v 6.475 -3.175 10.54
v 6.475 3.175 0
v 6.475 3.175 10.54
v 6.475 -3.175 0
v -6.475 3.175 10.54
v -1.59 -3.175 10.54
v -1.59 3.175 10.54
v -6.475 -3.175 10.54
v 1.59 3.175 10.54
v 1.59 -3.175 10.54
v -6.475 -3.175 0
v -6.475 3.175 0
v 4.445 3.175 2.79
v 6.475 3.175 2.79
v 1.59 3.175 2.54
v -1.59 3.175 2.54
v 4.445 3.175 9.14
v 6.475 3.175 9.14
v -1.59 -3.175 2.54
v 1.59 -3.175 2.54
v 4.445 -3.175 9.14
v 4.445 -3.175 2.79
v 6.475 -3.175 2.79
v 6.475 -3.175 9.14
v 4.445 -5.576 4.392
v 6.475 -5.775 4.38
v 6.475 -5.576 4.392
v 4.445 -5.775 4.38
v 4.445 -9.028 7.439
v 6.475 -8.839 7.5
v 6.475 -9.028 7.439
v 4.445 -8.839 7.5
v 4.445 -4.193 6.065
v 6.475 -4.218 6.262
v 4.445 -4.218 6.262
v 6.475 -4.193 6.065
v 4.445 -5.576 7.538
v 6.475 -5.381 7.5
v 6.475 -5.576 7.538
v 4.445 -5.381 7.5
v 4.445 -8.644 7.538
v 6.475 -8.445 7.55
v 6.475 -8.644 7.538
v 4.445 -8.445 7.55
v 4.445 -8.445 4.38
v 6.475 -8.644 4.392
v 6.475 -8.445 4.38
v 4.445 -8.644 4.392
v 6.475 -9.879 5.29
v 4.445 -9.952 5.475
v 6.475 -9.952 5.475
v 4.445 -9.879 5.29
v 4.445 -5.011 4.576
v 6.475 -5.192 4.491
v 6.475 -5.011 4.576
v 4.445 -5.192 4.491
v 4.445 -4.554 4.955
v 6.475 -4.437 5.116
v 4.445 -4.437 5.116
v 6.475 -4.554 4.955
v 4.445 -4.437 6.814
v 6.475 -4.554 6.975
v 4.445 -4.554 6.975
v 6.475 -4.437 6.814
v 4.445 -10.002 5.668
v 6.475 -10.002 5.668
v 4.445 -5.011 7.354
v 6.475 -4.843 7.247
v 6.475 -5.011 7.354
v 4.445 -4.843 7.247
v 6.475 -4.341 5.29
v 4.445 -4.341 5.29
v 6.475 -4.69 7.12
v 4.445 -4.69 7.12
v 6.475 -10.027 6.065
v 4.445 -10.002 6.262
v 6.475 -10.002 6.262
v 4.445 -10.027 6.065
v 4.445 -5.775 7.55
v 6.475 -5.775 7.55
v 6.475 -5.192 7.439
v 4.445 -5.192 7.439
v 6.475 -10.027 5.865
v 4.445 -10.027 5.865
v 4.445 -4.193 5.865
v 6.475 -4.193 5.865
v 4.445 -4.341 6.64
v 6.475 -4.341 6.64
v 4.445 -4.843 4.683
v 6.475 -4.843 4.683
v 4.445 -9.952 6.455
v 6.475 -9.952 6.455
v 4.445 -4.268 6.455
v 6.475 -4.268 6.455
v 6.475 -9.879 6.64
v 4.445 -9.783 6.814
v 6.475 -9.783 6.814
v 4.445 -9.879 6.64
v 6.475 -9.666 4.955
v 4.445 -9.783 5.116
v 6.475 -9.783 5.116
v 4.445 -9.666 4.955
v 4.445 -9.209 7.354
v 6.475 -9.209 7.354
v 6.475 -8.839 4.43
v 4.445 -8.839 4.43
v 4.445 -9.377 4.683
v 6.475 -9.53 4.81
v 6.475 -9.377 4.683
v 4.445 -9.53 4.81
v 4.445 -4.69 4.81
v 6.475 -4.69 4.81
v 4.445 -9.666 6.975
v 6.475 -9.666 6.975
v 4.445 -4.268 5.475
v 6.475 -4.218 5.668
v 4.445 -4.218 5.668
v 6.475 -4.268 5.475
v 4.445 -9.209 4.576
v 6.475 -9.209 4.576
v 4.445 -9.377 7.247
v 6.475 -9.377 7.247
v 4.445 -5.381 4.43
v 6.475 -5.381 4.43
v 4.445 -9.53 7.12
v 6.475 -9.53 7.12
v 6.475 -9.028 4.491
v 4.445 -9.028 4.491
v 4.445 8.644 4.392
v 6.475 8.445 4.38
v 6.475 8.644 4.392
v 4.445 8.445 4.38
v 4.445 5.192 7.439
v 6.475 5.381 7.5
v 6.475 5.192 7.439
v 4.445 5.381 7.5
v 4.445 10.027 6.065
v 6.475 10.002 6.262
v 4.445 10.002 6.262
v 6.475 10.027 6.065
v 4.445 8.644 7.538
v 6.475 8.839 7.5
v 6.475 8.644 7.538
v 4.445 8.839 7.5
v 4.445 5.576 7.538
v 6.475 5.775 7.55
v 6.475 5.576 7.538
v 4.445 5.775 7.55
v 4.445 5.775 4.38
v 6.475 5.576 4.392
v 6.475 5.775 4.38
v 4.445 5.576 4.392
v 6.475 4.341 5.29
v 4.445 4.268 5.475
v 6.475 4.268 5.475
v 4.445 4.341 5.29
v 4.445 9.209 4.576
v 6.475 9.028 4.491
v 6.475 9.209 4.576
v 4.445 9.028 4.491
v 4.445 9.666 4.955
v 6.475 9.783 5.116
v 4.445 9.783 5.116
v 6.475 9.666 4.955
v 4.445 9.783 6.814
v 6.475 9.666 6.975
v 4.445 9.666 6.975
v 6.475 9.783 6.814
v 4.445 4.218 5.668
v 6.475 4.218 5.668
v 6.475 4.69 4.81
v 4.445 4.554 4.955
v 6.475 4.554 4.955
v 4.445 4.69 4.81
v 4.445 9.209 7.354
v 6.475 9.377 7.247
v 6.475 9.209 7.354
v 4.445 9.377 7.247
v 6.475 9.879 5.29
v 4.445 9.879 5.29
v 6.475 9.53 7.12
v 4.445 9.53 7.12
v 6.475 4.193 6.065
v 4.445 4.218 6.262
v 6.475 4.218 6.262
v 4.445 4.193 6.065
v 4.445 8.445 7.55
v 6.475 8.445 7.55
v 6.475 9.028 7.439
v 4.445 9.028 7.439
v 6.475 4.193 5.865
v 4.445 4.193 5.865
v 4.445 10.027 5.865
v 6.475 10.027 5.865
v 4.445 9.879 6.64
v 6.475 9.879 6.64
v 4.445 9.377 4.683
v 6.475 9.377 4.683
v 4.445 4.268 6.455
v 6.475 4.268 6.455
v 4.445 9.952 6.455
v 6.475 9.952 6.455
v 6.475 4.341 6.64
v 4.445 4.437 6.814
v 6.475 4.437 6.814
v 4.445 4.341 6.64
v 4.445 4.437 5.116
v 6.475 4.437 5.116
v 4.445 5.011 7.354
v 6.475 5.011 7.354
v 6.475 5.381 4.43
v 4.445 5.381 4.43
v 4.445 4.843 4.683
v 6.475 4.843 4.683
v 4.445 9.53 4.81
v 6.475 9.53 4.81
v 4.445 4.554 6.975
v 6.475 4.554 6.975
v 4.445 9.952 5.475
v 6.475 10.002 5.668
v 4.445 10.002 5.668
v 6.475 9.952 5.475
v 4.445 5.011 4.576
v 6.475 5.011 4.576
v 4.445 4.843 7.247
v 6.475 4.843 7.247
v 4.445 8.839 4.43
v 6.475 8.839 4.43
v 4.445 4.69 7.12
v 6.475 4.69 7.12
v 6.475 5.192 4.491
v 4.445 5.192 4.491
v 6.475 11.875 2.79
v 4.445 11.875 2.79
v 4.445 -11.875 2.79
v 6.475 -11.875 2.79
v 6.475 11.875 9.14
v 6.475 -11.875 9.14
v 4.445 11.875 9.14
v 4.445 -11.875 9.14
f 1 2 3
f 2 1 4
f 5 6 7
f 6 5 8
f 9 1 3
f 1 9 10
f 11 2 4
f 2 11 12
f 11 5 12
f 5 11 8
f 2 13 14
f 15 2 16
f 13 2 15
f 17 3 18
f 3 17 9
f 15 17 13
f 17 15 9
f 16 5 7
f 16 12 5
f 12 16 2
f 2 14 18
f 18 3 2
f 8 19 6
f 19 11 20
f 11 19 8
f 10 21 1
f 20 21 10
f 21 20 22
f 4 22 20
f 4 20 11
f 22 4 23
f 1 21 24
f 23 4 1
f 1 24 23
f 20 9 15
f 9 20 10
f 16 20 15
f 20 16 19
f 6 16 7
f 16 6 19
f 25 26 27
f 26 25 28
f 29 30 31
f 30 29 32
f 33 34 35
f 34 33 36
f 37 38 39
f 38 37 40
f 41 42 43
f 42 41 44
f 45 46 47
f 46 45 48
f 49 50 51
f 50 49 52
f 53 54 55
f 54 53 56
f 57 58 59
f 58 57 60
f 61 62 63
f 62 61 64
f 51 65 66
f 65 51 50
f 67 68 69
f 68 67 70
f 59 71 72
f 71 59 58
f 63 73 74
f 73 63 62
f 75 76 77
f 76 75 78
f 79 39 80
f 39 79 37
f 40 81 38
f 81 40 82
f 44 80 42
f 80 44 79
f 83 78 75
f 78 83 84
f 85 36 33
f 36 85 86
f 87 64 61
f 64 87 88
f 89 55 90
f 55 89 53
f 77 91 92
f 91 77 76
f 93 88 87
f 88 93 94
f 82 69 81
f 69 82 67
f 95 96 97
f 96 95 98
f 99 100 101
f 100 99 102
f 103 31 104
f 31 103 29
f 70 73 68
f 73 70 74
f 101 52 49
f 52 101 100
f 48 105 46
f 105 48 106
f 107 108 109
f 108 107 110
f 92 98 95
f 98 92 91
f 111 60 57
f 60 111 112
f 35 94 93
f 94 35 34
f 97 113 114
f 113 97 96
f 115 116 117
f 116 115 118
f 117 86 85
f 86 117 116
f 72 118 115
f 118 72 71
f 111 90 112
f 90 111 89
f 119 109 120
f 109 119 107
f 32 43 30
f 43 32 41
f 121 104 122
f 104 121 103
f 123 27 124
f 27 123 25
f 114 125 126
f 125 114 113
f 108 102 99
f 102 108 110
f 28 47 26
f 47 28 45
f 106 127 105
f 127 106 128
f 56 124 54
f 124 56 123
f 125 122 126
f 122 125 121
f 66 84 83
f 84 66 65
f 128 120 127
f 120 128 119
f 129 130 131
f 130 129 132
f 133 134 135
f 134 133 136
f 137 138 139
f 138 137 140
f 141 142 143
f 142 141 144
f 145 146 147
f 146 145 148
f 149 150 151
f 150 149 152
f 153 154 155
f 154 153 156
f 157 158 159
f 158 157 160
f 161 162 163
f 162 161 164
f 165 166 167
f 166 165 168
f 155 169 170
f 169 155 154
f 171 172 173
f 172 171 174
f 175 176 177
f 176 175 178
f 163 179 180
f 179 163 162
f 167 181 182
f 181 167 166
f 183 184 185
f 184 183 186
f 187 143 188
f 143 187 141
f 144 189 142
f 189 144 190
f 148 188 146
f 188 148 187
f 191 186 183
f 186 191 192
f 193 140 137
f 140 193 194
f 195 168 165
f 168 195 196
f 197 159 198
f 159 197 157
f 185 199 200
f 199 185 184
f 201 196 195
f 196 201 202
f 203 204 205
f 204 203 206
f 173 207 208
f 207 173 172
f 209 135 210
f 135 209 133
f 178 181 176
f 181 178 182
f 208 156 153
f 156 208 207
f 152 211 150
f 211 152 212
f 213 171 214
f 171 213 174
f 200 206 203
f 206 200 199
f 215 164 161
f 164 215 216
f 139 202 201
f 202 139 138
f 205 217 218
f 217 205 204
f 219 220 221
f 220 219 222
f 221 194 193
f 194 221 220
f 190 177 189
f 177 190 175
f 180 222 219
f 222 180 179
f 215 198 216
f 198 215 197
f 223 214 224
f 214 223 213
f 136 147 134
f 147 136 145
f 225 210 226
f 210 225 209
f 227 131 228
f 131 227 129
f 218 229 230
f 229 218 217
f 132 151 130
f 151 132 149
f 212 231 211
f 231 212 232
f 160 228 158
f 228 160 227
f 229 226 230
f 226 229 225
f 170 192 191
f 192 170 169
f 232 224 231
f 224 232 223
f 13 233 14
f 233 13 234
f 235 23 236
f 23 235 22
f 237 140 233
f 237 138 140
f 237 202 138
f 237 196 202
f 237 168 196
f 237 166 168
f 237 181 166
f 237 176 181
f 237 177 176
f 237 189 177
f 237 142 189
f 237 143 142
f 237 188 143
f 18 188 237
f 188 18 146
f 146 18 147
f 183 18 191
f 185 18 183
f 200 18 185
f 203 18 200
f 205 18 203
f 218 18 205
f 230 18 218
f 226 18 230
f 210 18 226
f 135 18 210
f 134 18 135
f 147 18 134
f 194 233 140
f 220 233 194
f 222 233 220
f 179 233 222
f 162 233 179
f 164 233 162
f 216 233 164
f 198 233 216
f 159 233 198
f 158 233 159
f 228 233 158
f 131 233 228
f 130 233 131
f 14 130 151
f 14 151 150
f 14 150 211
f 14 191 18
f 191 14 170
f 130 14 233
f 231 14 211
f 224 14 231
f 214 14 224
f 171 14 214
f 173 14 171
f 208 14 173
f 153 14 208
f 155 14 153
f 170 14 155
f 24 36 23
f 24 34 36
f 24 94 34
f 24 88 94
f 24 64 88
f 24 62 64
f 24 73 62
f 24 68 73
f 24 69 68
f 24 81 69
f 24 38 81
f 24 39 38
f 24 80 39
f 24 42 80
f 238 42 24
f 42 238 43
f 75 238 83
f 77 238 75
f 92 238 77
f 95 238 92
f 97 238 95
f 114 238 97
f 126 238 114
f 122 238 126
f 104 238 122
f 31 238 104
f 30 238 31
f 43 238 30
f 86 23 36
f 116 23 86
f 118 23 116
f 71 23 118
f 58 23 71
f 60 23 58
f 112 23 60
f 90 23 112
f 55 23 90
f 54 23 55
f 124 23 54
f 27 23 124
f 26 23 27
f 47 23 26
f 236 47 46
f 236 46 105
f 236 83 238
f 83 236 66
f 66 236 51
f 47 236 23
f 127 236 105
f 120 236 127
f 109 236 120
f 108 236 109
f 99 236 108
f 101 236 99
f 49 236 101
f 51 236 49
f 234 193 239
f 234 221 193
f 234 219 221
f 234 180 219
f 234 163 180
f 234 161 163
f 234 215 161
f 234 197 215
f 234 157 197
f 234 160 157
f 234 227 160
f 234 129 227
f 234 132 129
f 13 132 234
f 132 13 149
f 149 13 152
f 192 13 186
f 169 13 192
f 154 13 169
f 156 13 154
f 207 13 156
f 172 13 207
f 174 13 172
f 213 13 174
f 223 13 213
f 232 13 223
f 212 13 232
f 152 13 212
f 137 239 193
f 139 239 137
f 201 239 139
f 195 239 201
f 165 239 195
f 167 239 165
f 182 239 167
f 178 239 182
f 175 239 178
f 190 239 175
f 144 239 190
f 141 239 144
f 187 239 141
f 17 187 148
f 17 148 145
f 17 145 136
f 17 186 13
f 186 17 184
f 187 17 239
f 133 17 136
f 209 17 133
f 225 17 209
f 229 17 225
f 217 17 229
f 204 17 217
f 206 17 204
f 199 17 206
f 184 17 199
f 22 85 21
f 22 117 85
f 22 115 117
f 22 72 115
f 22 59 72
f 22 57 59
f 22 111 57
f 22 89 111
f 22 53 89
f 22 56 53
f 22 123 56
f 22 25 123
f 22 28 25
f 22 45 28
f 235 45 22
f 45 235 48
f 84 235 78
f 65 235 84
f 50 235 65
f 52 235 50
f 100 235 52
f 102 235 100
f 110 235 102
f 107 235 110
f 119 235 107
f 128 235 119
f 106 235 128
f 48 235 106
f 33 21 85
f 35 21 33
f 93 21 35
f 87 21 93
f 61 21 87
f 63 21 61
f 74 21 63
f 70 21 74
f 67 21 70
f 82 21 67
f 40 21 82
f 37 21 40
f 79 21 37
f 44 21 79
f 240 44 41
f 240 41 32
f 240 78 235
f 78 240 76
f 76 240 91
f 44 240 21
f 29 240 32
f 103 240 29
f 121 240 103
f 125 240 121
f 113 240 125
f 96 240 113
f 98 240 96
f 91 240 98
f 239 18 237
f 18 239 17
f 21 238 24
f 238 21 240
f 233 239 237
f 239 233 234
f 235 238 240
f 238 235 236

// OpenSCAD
//http://www.ttelectronics.com/sites/default/files/download-files/OPB930-940-L-W_42.pdf
module make_photointerruptor_OPB940(){
    
    difference(){
        // main body
        translate([0,0,10.54/2])
        cube([12.95, 6.35, 10.54], center=true);
        
        // slot
        color("red")
        translate([0,0,20/2+2.54])
        cube([3.18, 20, 20], center=true);
    }
    
    translate([2.03/2+12.95/2-2.03,0,6.35/2+2.79])
    difference(){
        // mount tab body
        color("blue")
        rotate([0,90,0])
        translate([0,0,0])
        cube([6.35, 23.75, 2.03], center=true);
        
        color("green")
        for(i=[-1:2:1]) 
        //translate([0,(14.22/2+(5.84/2-3.17/2)*j)*i,0])
        translate([0,14.22/2*i,0])
        hull(){
            for(j=[-1:2:1])
            translate([0,(5.84/2-3.17/2)*j,0])
            rotate([0,90,0])
            cylinder(d=3.17, h=30, center=true, $fn=50);
        }
    }
}

make_photointerruptor_OPB940();
